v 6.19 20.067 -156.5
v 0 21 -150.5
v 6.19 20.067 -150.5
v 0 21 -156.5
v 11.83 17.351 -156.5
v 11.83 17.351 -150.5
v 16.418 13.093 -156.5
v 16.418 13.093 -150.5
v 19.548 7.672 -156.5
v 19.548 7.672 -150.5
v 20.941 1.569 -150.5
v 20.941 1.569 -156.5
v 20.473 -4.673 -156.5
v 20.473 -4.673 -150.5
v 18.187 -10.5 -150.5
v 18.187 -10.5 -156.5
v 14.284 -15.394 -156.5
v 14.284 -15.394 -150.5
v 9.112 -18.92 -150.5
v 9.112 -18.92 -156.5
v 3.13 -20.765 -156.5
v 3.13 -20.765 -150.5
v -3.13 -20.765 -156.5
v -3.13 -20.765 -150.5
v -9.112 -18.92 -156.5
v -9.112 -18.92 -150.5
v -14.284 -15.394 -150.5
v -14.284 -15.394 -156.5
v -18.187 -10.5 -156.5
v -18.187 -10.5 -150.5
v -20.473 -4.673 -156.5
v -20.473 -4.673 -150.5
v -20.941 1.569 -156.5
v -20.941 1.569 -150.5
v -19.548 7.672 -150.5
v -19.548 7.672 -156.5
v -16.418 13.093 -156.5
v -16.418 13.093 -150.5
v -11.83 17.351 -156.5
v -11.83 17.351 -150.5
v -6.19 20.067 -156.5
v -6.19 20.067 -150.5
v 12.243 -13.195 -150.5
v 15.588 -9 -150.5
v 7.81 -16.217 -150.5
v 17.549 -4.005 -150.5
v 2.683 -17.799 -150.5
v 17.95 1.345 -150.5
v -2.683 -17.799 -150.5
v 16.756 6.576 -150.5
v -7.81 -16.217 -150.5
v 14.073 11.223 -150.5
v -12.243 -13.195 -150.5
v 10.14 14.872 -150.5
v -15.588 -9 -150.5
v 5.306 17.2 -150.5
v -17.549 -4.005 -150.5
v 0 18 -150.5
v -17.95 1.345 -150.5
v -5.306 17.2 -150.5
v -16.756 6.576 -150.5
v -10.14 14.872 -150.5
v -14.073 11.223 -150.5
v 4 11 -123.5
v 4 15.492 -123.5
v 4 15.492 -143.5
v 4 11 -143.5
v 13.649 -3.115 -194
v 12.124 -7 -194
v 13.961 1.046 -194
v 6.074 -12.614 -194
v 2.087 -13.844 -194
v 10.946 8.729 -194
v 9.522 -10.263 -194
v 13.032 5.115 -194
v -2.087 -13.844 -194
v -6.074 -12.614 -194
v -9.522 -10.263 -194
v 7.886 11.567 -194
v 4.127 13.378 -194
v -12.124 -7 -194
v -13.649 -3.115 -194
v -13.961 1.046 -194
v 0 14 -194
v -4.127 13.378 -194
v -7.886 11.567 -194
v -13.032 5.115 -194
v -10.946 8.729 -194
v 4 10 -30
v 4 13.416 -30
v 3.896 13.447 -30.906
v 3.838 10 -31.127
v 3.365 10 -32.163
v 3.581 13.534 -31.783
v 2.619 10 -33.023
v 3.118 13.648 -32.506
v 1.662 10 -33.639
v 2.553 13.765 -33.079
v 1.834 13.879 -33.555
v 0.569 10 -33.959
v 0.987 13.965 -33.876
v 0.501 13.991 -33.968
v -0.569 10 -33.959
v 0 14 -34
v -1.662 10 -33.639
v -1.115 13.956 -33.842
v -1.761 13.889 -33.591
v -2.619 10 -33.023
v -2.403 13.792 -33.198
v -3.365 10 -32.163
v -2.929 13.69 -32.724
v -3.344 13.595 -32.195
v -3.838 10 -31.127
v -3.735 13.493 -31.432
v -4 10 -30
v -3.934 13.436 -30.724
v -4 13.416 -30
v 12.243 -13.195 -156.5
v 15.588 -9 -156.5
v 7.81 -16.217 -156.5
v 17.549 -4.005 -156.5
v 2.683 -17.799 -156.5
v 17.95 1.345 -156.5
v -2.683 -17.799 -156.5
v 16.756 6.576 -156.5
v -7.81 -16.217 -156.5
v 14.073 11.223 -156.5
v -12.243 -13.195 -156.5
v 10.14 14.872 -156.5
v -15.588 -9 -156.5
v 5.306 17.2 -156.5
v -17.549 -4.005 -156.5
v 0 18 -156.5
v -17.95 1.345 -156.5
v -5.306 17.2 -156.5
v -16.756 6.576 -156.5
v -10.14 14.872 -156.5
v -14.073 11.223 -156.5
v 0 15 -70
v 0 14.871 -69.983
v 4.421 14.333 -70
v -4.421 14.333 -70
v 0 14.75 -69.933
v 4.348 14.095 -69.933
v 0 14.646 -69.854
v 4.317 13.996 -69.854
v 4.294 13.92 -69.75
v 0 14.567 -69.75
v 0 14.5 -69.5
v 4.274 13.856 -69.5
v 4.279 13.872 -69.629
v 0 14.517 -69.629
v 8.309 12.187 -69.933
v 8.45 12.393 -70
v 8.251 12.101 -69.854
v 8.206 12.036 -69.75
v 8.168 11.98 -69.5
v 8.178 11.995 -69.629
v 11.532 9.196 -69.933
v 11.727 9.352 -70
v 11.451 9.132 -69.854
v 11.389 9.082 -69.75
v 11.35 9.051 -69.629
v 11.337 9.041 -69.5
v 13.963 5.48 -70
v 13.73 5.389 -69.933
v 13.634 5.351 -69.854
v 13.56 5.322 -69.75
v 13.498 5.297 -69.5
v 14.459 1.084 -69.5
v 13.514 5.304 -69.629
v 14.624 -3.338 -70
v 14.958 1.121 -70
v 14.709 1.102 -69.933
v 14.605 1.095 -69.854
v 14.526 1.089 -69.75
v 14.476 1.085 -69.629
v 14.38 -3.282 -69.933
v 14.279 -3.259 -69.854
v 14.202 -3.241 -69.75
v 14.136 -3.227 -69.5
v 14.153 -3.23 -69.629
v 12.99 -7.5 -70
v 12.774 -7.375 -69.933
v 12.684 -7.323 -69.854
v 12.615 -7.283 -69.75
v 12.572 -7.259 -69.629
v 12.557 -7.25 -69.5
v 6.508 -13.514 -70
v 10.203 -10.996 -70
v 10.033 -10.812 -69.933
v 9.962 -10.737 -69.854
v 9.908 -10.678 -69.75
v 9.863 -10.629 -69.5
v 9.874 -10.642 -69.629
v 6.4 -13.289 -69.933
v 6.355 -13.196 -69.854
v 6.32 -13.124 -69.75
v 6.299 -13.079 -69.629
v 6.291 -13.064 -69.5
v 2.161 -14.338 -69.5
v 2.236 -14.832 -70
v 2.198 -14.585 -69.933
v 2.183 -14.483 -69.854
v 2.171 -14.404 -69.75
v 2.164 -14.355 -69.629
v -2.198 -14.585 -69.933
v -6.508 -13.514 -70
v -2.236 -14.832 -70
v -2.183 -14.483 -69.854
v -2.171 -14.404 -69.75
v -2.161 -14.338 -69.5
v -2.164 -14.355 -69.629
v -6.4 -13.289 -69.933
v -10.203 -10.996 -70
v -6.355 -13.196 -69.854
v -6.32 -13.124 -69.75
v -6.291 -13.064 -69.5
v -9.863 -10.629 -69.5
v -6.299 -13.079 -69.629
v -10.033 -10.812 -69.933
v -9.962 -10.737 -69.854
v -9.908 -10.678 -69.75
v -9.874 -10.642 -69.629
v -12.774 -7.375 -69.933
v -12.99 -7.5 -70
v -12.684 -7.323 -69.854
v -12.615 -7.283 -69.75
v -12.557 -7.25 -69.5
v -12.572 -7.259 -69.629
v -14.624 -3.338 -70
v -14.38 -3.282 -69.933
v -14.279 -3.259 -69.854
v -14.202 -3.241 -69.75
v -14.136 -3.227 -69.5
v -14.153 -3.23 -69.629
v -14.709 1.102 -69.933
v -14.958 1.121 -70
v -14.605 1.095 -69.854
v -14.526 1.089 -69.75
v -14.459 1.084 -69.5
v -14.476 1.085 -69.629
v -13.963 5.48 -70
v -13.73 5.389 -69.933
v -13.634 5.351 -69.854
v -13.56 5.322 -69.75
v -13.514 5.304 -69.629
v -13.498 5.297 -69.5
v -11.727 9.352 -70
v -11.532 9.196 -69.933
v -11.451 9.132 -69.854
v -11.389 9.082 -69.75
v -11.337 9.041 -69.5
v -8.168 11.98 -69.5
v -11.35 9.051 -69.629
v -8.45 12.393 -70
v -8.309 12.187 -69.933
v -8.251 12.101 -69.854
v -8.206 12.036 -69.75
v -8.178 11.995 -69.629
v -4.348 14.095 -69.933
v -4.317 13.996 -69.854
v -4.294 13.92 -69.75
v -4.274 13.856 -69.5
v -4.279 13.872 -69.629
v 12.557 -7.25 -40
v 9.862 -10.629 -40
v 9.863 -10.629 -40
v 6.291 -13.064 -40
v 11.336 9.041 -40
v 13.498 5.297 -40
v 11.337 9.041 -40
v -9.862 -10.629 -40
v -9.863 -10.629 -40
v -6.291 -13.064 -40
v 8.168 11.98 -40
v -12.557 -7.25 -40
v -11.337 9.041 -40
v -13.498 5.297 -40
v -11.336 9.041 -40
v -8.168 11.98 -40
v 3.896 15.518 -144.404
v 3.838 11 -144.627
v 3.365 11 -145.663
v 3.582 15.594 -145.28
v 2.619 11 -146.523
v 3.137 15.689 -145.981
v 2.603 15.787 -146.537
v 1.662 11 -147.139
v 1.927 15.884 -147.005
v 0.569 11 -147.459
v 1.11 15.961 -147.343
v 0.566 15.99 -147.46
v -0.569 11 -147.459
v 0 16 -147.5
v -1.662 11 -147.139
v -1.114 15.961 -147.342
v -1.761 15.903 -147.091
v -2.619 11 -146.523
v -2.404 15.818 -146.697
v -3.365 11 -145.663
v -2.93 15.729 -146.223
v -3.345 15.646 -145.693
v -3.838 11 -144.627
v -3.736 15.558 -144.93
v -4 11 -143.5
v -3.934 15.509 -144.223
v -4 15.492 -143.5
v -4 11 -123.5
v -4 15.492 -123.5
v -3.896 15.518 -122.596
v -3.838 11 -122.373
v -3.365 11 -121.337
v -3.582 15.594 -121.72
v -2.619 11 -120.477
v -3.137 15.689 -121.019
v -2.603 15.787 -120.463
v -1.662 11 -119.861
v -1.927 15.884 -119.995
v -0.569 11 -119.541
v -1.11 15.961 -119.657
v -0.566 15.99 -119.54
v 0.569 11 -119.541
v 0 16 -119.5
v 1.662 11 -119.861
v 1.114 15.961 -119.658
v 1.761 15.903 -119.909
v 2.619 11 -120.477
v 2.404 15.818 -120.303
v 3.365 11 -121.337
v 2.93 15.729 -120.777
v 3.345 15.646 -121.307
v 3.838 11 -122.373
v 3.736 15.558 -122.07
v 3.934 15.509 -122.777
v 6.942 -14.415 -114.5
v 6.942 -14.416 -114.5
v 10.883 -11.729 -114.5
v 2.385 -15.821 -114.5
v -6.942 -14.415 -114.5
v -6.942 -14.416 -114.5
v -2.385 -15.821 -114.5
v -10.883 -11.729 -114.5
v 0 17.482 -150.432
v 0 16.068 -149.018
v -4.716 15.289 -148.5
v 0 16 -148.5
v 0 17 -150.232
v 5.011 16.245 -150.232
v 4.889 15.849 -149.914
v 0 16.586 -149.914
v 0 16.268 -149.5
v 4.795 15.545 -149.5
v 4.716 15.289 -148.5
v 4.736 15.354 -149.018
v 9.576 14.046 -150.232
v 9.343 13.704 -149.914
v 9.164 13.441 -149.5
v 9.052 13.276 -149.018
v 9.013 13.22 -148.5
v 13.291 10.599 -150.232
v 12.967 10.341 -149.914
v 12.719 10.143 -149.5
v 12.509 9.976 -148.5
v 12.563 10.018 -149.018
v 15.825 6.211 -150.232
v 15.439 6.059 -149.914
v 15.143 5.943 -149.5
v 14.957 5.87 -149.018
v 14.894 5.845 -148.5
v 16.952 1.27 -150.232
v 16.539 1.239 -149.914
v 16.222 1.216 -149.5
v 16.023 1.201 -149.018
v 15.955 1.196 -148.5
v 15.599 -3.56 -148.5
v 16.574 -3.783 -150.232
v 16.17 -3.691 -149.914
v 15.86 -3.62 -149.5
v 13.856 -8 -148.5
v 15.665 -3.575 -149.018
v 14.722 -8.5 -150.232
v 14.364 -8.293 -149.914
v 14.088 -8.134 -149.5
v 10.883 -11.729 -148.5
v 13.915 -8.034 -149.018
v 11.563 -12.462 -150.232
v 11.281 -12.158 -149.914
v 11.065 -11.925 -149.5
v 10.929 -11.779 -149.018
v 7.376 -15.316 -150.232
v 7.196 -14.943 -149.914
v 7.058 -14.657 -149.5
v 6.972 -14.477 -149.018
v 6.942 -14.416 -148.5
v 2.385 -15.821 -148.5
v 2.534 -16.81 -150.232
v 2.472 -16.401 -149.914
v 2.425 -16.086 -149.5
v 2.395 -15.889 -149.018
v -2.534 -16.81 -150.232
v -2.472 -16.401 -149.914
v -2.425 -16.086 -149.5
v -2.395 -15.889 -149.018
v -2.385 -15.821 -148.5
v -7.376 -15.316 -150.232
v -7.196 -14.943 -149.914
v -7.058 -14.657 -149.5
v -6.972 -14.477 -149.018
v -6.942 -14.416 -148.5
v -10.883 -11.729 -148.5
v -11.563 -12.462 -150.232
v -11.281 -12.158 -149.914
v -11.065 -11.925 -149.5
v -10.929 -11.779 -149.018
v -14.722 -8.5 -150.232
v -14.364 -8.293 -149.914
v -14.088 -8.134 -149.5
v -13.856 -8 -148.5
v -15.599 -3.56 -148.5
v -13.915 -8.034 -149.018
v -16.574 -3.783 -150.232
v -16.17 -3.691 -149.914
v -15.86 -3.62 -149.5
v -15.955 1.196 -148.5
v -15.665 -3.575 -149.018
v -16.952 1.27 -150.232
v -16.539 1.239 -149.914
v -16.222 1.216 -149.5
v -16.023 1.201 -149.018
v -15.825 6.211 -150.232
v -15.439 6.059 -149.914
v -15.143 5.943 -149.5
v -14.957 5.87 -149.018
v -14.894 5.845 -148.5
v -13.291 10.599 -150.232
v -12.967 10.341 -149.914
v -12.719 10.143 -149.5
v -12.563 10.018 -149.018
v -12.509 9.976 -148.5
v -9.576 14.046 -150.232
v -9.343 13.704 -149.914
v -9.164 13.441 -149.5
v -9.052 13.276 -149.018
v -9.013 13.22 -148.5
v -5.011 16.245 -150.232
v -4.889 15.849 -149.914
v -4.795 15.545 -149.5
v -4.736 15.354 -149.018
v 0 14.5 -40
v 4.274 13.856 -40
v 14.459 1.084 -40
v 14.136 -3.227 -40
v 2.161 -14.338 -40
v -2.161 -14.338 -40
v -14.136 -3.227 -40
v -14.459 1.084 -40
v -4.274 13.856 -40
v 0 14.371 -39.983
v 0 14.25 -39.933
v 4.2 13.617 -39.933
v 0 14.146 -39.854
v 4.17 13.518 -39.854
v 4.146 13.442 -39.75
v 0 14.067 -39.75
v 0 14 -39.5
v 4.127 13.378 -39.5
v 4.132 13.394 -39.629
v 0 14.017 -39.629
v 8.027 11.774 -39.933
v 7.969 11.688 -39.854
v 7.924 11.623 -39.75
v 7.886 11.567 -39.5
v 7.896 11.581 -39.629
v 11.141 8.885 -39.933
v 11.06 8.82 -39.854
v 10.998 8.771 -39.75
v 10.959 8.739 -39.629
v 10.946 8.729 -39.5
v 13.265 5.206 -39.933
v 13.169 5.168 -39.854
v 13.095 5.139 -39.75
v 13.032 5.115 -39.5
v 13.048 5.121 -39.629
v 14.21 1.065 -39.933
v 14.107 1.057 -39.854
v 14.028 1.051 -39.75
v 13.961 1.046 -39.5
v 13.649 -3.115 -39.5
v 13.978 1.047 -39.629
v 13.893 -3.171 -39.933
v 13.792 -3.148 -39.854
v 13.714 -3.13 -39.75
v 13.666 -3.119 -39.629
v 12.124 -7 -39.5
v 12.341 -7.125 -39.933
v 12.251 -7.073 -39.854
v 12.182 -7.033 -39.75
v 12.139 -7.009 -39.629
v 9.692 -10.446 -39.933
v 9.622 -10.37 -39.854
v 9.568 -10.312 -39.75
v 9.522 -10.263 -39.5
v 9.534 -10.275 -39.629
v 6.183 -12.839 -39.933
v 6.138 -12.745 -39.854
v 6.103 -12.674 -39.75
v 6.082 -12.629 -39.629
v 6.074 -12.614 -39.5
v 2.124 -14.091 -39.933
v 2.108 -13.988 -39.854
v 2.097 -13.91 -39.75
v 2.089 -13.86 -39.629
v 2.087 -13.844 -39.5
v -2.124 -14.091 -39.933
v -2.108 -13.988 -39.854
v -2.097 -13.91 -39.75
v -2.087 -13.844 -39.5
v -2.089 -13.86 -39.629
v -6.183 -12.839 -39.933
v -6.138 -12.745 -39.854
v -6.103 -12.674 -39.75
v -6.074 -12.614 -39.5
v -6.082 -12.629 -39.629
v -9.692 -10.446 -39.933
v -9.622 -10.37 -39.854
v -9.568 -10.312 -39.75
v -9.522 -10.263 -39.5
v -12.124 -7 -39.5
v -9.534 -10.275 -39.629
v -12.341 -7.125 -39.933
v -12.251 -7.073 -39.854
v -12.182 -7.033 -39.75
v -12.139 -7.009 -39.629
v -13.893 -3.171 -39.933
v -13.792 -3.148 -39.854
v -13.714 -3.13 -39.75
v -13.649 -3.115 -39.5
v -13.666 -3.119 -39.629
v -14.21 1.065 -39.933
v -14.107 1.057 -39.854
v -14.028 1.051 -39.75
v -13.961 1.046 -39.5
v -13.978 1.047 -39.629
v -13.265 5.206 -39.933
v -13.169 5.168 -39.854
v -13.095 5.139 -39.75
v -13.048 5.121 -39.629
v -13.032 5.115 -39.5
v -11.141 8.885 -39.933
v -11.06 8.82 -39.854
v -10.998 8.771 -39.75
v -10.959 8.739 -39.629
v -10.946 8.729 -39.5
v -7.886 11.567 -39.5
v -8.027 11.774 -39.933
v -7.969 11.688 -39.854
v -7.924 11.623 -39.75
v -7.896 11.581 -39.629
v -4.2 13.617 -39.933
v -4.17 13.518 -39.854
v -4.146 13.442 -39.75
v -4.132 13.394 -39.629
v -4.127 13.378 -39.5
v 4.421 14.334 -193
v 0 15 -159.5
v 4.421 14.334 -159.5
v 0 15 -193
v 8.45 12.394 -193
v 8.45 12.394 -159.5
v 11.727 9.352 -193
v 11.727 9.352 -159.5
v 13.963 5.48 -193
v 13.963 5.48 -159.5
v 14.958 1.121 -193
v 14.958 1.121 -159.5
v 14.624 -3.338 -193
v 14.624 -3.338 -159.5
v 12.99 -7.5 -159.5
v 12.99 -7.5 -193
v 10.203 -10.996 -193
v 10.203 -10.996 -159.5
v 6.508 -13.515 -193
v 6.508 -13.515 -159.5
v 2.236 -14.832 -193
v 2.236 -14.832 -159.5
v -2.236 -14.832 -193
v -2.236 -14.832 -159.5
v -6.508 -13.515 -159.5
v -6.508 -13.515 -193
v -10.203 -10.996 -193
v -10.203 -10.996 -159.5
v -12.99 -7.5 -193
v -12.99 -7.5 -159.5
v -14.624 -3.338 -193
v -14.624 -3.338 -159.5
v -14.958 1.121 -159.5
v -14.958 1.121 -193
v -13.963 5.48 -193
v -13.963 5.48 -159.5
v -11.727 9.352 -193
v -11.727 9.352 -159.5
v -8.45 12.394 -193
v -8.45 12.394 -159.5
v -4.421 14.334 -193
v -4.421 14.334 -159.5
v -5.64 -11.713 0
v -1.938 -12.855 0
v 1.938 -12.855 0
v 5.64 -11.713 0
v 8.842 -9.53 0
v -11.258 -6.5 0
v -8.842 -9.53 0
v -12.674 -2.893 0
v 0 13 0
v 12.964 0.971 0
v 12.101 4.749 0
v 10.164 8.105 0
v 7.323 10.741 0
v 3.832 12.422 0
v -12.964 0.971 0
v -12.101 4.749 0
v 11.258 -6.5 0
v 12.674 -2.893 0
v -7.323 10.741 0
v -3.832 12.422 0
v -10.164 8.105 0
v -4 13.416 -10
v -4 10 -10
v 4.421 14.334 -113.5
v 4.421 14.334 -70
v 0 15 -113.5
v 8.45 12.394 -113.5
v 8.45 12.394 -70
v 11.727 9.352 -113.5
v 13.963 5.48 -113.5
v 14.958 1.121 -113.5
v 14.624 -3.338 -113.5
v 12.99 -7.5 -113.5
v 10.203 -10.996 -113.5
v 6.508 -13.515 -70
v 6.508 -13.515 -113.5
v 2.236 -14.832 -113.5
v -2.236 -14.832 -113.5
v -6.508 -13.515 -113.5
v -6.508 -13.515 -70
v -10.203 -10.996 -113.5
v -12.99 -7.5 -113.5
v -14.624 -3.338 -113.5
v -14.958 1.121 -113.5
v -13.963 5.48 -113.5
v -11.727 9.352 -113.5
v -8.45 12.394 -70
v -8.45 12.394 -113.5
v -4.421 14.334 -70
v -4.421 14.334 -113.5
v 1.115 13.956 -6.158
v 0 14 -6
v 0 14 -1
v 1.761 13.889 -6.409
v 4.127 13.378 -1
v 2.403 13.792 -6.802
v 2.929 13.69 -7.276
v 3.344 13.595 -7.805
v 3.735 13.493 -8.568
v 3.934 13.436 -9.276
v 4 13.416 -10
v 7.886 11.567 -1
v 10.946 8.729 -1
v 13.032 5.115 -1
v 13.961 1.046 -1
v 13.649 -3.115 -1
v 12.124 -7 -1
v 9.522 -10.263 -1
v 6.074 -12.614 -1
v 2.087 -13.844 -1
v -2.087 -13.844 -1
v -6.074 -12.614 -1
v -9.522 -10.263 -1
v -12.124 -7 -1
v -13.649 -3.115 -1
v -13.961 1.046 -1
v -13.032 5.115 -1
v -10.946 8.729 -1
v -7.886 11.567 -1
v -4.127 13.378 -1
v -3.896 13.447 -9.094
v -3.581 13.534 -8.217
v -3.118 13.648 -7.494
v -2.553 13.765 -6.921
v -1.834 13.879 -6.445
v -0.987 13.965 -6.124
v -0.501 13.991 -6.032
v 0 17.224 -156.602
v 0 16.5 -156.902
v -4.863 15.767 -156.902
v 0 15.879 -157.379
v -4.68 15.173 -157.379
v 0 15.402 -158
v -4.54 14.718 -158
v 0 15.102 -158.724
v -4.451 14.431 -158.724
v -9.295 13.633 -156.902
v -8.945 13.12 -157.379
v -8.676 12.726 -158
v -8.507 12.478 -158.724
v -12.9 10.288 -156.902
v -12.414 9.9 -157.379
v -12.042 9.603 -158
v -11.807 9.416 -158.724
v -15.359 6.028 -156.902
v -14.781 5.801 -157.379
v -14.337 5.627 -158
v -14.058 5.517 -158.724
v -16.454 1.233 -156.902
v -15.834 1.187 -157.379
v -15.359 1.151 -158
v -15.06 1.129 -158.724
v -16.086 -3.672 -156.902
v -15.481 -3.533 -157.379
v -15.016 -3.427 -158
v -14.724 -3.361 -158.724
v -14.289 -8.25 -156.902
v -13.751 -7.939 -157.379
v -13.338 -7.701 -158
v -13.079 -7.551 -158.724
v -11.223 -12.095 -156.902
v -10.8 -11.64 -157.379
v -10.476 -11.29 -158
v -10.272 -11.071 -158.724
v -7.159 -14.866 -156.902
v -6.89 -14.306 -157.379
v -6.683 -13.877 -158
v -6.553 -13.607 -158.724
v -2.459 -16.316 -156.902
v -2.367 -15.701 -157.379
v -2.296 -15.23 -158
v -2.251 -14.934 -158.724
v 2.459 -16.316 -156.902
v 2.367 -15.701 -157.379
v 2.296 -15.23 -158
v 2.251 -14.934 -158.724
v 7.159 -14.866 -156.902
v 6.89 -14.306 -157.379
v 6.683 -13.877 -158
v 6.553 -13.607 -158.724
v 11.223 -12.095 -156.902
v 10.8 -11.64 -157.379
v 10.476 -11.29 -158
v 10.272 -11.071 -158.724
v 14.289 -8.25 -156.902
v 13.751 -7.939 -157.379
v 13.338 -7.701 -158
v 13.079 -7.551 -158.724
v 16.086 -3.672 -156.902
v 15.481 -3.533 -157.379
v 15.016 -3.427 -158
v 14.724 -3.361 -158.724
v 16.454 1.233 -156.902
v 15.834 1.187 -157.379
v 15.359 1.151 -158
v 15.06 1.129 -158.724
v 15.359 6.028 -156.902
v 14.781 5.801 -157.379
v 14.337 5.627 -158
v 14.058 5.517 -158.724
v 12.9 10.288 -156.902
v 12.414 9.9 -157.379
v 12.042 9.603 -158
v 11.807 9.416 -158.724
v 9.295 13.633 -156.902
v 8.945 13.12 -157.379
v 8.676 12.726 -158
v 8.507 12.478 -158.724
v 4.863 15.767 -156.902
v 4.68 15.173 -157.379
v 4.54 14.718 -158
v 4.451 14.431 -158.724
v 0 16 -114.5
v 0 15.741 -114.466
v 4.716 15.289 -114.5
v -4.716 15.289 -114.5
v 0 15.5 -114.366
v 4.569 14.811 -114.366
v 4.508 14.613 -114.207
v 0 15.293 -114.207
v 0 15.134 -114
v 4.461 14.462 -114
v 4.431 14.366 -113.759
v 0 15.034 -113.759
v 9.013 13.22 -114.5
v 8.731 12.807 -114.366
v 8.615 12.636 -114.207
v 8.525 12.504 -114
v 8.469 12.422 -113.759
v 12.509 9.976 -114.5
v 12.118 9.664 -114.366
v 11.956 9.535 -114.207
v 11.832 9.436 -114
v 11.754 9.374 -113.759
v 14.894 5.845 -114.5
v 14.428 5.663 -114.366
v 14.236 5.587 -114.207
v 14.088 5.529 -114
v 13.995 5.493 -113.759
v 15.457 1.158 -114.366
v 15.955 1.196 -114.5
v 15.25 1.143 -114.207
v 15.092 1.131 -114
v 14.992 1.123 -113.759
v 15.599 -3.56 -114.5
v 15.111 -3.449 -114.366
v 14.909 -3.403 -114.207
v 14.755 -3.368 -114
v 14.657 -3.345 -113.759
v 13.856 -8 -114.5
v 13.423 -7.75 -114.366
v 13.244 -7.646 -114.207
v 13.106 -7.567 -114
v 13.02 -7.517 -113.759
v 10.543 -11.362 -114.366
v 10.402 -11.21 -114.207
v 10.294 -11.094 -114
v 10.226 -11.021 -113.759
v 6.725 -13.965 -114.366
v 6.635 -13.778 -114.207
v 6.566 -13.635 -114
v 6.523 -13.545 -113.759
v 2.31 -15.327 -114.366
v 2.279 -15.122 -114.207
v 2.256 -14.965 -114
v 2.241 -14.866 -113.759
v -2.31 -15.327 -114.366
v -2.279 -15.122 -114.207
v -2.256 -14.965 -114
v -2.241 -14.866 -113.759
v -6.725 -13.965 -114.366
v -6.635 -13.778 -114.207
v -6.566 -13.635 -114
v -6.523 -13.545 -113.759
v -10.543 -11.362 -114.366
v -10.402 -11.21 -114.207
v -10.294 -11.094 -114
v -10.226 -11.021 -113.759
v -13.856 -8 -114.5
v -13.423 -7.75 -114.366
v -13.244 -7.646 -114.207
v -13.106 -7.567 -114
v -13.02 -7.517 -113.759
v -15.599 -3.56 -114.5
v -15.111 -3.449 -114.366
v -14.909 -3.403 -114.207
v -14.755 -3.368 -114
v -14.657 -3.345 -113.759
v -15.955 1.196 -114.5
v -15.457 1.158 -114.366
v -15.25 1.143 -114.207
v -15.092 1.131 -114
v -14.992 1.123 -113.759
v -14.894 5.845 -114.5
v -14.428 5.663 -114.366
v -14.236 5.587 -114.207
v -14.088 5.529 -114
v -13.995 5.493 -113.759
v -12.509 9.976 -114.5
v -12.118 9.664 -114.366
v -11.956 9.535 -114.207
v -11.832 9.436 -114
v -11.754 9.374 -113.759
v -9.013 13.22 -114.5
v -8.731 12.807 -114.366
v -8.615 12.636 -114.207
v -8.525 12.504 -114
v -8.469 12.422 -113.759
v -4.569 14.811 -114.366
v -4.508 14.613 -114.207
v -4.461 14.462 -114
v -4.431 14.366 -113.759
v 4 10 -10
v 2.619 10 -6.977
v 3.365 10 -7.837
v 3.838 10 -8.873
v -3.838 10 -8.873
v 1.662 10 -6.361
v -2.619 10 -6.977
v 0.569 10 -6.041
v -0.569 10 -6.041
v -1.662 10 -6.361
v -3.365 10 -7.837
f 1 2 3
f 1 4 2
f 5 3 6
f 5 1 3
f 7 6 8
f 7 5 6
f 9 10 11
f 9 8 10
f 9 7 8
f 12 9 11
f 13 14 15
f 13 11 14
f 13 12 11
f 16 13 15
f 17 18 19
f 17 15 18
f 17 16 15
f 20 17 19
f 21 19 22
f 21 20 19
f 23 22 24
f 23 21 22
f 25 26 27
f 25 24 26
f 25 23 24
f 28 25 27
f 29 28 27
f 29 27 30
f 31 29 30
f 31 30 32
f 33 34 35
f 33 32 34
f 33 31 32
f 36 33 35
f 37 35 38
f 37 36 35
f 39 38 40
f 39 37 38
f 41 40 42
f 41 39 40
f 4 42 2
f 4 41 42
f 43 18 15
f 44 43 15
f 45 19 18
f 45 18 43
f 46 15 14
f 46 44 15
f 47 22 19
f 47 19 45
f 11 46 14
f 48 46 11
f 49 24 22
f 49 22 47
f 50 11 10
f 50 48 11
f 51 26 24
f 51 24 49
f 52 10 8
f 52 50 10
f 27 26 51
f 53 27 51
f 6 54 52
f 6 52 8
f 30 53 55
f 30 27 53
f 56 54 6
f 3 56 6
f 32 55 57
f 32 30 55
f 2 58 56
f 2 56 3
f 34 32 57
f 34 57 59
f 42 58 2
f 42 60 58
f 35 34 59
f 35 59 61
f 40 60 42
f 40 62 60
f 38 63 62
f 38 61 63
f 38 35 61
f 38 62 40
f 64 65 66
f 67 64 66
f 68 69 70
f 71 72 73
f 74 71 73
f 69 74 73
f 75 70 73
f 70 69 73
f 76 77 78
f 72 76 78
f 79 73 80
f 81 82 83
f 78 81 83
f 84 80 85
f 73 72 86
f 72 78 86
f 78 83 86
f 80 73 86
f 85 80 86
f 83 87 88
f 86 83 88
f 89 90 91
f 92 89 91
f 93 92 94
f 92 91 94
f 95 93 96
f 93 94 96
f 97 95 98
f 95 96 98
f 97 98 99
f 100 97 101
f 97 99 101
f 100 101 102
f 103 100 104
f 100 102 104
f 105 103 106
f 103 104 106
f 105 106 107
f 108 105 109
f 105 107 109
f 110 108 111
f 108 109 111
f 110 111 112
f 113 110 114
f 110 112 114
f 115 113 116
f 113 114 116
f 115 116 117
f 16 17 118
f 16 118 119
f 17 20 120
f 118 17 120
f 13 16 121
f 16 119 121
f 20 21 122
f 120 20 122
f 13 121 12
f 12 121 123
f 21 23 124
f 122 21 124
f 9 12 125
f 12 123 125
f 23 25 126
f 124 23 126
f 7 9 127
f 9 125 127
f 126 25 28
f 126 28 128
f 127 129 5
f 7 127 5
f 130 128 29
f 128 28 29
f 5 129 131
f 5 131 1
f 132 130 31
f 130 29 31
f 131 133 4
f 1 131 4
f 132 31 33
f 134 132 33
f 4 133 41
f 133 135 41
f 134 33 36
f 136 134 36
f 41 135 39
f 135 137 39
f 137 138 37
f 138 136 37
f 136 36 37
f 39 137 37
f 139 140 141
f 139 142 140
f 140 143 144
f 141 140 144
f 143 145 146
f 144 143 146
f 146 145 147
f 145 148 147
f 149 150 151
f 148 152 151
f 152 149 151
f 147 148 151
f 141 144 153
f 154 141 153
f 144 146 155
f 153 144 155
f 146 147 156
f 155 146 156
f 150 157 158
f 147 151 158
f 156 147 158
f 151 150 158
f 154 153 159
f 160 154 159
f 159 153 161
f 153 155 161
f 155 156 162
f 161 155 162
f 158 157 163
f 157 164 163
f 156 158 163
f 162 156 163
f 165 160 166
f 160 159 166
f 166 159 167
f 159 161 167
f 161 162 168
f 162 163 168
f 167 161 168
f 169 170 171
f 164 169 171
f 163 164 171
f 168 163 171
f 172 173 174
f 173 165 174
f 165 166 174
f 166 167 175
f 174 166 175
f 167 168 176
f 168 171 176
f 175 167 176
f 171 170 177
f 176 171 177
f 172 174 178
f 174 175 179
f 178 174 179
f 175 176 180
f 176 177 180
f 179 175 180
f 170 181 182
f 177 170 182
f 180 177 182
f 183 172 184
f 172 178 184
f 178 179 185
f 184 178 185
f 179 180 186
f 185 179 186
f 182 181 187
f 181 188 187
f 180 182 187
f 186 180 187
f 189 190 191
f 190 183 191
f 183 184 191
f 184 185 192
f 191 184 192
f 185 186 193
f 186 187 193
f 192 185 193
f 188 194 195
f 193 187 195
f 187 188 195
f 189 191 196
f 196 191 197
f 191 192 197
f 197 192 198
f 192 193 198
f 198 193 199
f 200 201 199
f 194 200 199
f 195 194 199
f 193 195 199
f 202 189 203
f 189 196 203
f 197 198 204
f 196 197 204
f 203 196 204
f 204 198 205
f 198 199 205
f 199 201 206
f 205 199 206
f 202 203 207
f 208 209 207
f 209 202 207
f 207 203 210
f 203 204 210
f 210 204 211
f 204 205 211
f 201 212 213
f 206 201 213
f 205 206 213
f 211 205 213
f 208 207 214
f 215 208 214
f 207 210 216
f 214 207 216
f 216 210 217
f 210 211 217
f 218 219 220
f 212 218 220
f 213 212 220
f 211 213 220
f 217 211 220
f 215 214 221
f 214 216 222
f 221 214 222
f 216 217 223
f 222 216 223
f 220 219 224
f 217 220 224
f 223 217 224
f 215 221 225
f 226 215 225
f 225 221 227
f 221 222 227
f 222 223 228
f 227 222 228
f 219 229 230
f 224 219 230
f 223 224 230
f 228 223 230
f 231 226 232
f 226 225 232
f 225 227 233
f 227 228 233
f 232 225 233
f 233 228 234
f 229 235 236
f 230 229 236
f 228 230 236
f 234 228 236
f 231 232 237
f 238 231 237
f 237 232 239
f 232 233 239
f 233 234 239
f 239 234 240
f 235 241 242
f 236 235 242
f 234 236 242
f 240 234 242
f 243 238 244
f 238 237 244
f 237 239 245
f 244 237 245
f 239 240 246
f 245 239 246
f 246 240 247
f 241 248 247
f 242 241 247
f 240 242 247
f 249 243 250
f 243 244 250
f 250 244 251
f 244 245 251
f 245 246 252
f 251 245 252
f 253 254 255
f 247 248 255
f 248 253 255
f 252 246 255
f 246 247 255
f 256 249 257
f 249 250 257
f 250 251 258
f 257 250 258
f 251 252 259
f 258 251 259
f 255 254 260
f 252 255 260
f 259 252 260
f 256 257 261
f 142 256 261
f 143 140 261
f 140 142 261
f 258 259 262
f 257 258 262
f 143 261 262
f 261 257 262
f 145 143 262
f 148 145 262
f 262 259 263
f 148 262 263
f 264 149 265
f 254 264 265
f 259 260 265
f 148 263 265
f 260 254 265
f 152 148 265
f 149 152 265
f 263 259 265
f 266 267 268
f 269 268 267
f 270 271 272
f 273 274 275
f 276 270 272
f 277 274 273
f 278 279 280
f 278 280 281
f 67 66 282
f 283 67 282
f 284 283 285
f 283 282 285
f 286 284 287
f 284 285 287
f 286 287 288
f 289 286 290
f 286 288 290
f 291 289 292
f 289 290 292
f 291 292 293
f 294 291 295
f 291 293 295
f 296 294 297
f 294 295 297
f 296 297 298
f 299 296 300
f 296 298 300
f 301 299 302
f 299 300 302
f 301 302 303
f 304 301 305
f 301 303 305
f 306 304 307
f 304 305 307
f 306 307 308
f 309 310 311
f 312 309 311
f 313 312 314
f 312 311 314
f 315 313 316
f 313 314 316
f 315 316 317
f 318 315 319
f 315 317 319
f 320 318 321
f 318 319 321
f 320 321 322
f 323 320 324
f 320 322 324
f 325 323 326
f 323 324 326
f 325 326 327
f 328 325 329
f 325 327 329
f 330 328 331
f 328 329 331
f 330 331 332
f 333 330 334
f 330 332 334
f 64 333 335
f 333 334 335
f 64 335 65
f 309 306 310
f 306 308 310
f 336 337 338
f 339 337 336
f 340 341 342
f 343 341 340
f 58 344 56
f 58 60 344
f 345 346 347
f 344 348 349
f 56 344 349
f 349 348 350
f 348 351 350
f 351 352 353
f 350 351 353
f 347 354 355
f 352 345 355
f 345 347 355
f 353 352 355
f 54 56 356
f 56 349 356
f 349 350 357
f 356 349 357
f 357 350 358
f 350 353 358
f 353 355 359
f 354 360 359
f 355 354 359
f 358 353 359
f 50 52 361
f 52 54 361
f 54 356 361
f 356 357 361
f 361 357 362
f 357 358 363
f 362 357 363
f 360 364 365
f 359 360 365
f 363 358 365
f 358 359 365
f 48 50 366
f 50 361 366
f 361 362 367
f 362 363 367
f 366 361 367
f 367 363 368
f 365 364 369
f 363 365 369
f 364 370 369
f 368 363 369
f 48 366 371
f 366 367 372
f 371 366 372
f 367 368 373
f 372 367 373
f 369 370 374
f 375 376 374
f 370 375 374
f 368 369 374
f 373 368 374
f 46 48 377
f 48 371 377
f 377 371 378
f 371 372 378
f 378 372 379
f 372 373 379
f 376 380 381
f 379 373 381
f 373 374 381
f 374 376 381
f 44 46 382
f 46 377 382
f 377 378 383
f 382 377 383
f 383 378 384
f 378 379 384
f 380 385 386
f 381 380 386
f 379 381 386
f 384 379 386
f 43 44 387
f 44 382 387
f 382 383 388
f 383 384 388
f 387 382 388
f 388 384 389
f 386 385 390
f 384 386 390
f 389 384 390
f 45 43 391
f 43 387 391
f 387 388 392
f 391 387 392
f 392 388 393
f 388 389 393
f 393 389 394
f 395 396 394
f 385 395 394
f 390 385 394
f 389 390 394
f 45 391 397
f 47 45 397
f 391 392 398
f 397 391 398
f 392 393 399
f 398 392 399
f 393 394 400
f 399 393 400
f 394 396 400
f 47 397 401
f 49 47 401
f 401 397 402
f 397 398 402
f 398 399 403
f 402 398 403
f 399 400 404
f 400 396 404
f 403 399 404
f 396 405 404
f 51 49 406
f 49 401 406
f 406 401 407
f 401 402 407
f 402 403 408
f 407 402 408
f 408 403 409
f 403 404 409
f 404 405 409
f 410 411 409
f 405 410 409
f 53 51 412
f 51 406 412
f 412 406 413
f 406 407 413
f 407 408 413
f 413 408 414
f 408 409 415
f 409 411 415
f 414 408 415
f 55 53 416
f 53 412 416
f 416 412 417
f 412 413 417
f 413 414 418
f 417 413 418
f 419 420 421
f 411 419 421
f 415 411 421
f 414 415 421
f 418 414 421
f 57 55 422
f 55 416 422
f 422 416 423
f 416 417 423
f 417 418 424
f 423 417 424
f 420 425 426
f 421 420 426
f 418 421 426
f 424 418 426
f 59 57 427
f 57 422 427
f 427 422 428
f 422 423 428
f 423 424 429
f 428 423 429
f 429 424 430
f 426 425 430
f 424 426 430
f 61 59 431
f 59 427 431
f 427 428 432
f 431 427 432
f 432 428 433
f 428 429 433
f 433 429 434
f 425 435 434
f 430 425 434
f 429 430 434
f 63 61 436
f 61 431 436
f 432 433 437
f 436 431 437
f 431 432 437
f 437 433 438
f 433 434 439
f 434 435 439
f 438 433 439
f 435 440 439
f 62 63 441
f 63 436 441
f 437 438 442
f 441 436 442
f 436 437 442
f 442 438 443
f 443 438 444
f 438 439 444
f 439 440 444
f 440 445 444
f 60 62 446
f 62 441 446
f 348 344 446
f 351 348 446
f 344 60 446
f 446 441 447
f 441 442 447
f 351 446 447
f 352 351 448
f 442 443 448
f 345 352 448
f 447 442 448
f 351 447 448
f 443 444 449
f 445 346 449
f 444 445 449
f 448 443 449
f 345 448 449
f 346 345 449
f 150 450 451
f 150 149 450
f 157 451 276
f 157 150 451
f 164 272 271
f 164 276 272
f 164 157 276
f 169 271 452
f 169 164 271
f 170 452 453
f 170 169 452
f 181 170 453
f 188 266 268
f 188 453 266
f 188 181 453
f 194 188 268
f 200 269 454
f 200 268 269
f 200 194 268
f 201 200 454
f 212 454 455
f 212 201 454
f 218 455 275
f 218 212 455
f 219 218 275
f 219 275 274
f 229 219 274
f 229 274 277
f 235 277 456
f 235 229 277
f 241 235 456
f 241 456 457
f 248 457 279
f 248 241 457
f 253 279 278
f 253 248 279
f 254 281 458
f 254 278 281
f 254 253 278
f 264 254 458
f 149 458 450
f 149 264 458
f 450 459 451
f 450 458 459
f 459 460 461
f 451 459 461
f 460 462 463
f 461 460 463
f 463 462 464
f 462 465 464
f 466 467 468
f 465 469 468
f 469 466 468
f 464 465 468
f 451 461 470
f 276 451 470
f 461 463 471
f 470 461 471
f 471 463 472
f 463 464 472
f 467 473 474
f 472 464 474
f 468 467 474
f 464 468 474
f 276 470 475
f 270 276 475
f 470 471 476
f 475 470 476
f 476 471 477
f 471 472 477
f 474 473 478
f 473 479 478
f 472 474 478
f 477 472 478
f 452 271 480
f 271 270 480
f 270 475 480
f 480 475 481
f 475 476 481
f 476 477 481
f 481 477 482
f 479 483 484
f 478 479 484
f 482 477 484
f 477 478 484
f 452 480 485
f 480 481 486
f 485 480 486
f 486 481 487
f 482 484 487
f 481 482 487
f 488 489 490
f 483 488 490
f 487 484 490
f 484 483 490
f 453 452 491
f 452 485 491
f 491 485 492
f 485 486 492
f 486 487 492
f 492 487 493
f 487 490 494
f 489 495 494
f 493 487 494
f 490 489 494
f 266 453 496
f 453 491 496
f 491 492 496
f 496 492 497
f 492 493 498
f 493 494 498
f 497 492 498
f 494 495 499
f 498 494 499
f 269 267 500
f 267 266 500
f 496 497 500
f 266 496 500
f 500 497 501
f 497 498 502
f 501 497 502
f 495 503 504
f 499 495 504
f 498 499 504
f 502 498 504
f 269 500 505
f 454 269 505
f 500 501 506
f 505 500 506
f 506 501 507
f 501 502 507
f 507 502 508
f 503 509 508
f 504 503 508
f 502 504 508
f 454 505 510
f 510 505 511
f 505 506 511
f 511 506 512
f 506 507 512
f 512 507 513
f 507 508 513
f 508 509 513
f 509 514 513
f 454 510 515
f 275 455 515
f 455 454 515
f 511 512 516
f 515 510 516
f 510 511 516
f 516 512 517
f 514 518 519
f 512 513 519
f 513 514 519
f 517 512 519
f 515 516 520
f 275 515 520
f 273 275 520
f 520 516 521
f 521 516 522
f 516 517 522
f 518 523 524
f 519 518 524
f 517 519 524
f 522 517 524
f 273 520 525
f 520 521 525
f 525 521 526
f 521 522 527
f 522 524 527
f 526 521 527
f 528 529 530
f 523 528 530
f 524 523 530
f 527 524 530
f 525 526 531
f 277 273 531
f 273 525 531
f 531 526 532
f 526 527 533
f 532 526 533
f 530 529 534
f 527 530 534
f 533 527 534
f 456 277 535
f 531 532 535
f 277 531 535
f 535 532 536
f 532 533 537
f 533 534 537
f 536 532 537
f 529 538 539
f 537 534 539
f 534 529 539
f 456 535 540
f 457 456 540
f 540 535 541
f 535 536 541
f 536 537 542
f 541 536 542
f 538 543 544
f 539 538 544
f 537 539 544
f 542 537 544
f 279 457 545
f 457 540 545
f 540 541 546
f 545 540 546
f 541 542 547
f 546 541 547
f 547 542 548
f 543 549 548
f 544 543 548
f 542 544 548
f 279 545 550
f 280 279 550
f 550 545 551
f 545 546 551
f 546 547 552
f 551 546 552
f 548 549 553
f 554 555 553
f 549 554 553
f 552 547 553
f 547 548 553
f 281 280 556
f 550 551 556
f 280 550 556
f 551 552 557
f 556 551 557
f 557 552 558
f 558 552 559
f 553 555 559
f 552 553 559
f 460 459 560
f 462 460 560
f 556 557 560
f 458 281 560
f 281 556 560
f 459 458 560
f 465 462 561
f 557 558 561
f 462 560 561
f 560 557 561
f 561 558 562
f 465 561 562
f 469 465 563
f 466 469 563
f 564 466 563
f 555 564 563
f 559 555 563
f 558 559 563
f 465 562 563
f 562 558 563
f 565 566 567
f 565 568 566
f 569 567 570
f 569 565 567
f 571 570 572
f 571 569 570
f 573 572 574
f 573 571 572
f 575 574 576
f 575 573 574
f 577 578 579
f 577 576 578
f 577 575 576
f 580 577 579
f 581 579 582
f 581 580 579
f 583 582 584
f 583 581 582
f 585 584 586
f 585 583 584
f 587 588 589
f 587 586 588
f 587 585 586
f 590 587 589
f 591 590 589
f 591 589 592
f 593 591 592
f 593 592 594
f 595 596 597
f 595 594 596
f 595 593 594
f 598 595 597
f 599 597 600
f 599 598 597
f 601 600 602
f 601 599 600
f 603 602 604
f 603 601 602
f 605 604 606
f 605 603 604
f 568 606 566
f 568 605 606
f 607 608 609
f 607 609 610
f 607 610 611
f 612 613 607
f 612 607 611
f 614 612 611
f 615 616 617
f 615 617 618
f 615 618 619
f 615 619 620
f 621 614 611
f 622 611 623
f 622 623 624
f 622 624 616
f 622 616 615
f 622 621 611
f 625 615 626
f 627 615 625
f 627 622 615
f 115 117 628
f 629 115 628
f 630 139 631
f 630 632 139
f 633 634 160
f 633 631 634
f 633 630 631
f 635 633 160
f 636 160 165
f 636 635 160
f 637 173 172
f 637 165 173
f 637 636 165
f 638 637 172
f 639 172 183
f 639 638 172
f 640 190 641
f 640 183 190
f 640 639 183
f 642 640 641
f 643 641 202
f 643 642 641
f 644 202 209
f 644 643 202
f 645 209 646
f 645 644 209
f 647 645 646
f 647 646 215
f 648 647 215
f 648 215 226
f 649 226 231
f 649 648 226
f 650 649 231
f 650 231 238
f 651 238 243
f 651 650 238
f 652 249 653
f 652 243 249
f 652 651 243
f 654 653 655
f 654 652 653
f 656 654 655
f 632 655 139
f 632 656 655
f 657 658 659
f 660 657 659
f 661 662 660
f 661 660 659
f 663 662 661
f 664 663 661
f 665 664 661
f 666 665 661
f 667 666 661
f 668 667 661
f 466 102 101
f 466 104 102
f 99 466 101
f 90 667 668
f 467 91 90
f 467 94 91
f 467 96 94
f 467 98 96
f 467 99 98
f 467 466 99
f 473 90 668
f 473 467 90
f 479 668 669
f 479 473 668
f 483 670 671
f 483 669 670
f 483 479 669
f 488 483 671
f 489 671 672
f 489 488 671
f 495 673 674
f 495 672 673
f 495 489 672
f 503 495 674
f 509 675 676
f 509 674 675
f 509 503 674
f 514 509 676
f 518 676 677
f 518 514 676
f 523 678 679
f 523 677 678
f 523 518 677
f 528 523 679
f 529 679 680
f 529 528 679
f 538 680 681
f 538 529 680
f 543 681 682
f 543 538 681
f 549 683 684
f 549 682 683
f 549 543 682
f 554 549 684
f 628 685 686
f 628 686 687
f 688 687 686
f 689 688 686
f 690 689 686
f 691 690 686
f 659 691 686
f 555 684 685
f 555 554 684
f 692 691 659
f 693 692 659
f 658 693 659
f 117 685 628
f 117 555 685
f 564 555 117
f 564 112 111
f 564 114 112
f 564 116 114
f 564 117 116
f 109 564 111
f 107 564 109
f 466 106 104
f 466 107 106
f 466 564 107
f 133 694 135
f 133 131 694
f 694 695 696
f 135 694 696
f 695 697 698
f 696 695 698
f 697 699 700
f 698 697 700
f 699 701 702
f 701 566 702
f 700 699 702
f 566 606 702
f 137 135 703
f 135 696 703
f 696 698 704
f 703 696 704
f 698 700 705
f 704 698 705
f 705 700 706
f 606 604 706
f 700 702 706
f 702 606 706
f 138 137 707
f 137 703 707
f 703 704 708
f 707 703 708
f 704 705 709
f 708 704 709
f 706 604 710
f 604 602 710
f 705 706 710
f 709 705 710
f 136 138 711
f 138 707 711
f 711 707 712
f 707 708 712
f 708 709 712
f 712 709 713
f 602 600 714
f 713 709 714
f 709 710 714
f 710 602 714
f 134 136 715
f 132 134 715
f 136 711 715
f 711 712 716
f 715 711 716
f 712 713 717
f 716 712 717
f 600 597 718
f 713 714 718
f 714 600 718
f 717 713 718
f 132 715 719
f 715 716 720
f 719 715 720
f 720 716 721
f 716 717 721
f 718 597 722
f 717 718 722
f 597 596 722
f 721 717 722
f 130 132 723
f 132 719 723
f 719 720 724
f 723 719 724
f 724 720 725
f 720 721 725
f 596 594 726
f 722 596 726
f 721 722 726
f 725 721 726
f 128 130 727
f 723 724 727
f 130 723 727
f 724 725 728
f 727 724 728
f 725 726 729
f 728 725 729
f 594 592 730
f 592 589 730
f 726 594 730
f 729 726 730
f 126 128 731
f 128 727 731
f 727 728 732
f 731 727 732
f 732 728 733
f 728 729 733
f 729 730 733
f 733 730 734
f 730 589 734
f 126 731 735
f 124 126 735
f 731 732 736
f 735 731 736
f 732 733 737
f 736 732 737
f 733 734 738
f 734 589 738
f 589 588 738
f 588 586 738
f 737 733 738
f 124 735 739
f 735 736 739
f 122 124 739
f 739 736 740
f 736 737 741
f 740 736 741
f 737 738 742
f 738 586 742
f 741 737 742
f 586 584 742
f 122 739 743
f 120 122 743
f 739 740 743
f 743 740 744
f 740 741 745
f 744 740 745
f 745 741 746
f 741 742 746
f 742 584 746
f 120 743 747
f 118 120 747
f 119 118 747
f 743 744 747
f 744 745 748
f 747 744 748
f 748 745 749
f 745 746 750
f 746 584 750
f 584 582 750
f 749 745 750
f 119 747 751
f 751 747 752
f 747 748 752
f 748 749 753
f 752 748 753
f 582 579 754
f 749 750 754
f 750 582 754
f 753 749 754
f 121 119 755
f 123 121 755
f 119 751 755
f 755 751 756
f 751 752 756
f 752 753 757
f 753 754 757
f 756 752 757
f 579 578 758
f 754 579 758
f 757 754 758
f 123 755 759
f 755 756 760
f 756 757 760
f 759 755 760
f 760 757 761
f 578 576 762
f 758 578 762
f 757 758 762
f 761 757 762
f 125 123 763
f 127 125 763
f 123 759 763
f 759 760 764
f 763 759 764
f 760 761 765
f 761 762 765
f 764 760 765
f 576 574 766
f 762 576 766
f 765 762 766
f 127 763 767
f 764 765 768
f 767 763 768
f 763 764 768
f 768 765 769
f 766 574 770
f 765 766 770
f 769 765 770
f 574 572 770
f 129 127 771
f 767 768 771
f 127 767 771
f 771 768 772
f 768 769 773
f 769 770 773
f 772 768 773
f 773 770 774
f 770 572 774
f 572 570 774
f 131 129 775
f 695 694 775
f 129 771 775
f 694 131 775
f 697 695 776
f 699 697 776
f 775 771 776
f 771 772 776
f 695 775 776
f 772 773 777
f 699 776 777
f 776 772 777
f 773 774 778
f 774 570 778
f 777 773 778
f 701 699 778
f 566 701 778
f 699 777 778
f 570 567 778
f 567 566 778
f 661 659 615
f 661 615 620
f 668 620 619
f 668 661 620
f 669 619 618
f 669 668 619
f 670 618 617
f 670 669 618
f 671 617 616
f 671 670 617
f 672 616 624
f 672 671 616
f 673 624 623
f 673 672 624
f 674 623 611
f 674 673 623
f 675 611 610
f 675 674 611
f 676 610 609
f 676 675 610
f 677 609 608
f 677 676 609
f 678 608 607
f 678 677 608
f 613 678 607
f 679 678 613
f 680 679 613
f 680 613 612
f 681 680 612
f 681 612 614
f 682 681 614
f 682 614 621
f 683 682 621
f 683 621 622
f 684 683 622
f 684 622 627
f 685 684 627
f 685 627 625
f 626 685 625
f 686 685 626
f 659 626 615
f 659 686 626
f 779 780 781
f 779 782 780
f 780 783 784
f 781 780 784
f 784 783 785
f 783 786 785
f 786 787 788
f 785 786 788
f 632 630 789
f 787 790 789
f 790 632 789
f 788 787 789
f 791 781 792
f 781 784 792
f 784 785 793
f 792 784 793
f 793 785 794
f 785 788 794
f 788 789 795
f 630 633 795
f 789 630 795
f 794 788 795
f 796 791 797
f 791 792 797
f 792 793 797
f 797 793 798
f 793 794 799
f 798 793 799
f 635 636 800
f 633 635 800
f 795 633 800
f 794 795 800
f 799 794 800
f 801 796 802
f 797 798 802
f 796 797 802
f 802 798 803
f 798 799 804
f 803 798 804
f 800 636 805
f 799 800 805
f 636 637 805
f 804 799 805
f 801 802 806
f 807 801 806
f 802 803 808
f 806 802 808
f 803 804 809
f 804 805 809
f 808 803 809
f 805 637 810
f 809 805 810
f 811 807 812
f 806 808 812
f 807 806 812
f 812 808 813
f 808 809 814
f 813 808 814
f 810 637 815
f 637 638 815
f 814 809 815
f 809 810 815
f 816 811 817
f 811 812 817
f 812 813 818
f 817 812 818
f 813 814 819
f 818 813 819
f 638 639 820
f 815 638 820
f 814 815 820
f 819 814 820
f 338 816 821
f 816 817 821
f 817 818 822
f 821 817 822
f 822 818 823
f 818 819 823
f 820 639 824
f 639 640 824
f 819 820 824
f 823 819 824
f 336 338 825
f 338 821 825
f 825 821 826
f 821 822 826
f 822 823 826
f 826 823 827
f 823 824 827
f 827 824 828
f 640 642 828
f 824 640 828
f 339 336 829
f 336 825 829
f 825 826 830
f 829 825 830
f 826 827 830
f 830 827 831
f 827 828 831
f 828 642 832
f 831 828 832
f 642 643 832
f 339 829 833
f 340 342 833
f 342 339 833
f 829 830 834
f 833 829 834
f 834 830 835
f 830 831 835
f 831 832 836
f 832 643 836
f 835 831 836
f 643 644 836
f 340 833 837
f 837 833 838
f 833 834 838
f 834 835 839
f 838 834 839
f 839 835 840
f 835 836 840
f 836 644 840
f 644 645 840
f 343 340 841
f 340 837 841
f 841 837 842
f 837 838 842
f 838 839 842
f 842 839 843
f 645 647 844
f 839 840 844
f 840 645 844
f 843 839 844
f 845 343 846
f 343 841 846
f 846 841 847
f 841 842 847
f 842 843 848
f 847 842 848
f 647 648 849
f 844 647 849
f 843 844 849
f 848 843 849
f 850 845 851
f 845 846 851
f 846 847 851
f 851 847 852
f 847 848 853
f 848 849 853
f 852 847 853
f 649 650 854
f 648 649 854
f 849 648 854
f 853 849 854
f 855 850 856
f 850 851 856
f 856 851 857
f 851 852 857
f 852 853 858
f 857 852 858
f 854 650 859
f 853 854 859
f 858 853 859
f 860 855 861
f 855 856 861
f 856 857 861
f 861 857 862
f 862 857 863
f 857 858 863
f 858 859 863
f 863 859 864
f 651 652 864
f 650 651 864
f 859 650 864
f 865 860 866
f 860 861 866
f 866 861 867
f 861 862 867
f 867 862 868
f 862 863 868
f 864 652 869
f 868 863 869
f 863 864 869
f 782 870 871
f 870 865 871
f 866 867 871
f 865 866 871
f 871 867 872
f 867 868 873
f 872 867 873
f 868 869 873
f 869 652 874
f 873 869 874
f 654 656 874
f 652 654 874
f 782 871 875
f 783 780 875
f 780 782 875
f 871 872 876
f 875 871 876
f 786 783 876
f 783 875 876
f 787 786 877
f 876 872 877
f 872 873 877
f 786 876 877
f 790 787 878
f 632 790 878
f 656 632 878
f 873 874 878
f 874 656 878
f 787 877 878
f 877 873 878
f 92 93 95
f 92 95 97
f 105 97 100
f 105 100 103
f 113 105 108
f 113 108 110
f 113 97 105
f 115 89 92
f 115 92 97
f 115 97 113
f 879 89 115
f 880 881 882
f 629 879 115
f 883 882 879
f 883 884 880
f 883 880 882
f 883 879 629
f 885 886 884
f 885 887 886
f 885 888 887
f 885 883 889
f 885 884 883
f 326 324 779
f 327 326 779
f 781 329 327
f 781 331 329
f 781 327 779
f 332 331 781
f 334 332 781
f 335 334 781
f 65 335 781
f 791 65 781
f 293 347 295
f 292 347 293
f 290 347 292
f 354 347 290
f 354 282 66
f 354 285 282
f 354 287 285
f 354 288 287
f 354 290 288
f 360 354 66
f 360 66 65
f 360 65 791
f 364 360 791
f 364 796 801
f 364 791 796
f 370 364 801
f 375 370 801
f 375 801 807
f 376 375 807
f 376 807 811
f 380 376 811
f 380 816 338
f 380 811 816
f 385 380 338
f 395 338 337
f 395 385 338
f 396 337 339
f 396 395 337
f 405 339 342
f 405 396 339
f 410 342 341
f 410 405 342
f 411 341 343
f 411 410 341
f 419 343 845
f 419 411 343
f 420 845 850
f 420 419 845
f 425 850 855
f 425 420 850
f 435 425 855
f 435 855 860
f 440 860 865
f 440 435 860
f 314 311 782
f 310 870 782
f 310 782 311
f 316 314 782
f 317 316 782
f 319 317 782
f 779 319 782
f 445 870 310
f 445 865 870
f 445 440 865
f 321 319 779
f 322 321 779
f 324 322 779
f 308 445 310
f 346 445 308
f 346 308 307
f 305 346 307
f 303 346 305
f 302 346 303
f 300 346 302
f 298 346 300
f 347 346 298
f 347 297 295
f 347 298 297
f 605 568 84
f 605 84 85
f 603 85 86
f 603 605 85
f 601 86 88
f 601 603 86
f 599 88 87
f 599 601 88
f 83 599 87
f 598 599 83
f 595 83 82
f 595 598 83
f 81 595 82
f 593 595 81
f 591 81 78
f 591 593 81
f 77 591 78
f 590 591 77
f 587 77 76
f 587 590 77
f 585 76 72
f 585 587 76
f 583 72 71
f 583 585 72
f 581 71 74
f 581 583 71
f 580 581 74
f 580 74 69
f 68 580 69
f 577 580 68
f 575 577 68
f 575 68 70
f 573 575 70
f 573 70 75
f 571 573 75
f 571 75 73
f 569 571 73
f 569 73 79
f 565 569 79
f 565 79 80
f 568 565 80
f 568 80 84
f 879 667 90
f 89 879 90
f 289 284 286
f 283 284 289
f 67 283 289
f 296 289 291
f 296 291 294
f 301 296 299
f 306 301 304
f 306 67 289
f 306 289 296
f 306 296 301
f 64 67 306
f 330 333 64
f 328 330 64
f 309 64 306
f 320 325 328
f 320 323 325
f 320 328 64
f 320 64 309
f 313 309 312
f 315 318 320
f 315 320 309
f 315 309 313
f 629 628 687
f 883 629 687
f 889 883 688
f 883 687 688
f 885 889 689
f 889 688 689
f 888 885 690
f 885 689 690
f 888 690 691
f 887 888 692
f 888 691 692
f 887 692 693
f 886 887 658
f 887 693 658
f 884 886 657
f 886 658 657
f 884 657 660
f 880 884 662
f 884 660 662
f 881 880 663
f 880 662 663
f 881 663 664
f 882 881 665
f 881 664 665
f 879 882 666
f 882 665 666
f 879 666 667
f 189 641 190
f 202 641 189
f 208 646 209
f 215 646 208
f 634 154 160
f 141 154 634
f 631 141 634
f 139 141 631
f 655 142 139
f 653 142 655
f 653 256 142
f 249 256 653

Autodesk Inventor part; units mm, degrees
ref_plane "YZ Plane" through (0, 0, 0) normal (1, 0, 0) x (0, 1, 0)
sketch "Sketch1" plane through (0, 0, 0) normal (1, 0, 0) x (0, 1, 0)
  line L0 (0, 0) -> (14, 0)
  line L1 (14, 0) -> (14, -40)
  line L2 (14, -40) -> (14.5, -40)
  line L3 (14.5, -40) -> (14.5, -70)
  line L4 (14.5, -70) -> (15, -70)
  line L5 (15, -70) -> (15, -114.5)
  line L6 (15, -114.5) -> (16, -114.5)
  line L7 (16, -114.5) -> (16, -150.5)
  line L8 (16, -150.5) -> (21, -150.5)
  line L9 (21, -150.5) -> (21, -156.5)
  line L10 (21, -156.5) -> (15, -156.5)
  line L11 (15, -156.5) -> (15, -194)
  line L12 (0, -232.8) -> (0, 38.8) projected
  line L13 (15, -194) -> (0, -194)
  dimension "d0" = 40
  dimension "d1" = 14
  dimension "d2" = 30
  dimension "d3" = 14.5
  dimension "d4" = 15
  dimension "d5" = 44.5
  dimension "d9" = 16
  dimension "d10" = 21
  dimension "d11" = 6
  dimension "d12" = 37.5
  dimension "d14" = 36
  dimension "d24" = 15
revolve "Revolution1" add sketch "Sketch1" angle 360 about axis through (0, 0, -10) along (0, 0, 1)
chamfer "Chamfer1" distance 1 angle 45 2 edges at (0, -15, -194) (0, -14, 0)
fillet "Fillet1" radius 3 1 edges at (0, -15, -156.5)
fillet "Fillet2" radius 2 1 edges at (0, -16, -150.5)
fillet "Fillet3" radius 1 1 edges at (0, -15, -114.5)
fillet "Fillet4" radius 0.5 2 edges at (0, -14.5, -70) (0, -14, -40)
ref_plane "Work Plane1" through (0, 14, 0) normal (0, 1, 0) x (-1, 0, 0)
sketch "Sketch2" plane through (0, 14, 0) normal (0, 1, 0) x (-1, 0, 0)
  line L0 (0, -40.8) -> (0, 6.8) projected
  line L1 (0, -10) -> (0, -30) construction
  line L2 (-4, -10) -> (-4, -30)
  line L3 (4, -30) -> (4, -10)
  arc A0 (4, -10) -> (-4, -10) centre (0, -10) ccw
  arc A1 (-4, -30) -> (4, -30) centre (0, -30) ccw
  point P0 (0, 0)
  point P1 (0, -20)
  dimension "d26" = 10
  dimension "d27" = 8
  dimension "d28" = 20
extrude "Extrusion1" cut sketch "Sketch2" against normal blind 4
ref_plane "Work Plane2" through (0, 16, 0) normal (0, 1, 0) x (-1, 0, 0)
sketch "Sketch3" plane through (0, 16, 0) normal (0, 1, 0) x (-1, 0, 0)
  line L0 (0, -177) -> (0, 29.5) projected
  line L1 (0, -143.5) -> (0, -123.5) construction
  line L2 (4, -143.5) -> (4, -123.5)
  line L3 (-4, -123.5) -> (-4, -143.5)
  arc A0 (-4, -143.5) -> (4, -143.5) centre (0, -143.5) ccw
  arc A1 (4, -123.5) -> (-4, -123.5) centre (0, -123.5) ccw
  line L4 (-15, -113.5) -> (15, -113.5) projected
  line L5 (-16, -114.5) -> (16, -114.5) projected
  point P0 (0, 0)
  point P1 (0, -133.5)
  dimension "d32" = 8
  dimension "d34" = 9
  dimension "d35" = 20
extrude "Extrusion2" cut sketch "Sketch3" against normal blind 5
properties part number "Truc_2"
